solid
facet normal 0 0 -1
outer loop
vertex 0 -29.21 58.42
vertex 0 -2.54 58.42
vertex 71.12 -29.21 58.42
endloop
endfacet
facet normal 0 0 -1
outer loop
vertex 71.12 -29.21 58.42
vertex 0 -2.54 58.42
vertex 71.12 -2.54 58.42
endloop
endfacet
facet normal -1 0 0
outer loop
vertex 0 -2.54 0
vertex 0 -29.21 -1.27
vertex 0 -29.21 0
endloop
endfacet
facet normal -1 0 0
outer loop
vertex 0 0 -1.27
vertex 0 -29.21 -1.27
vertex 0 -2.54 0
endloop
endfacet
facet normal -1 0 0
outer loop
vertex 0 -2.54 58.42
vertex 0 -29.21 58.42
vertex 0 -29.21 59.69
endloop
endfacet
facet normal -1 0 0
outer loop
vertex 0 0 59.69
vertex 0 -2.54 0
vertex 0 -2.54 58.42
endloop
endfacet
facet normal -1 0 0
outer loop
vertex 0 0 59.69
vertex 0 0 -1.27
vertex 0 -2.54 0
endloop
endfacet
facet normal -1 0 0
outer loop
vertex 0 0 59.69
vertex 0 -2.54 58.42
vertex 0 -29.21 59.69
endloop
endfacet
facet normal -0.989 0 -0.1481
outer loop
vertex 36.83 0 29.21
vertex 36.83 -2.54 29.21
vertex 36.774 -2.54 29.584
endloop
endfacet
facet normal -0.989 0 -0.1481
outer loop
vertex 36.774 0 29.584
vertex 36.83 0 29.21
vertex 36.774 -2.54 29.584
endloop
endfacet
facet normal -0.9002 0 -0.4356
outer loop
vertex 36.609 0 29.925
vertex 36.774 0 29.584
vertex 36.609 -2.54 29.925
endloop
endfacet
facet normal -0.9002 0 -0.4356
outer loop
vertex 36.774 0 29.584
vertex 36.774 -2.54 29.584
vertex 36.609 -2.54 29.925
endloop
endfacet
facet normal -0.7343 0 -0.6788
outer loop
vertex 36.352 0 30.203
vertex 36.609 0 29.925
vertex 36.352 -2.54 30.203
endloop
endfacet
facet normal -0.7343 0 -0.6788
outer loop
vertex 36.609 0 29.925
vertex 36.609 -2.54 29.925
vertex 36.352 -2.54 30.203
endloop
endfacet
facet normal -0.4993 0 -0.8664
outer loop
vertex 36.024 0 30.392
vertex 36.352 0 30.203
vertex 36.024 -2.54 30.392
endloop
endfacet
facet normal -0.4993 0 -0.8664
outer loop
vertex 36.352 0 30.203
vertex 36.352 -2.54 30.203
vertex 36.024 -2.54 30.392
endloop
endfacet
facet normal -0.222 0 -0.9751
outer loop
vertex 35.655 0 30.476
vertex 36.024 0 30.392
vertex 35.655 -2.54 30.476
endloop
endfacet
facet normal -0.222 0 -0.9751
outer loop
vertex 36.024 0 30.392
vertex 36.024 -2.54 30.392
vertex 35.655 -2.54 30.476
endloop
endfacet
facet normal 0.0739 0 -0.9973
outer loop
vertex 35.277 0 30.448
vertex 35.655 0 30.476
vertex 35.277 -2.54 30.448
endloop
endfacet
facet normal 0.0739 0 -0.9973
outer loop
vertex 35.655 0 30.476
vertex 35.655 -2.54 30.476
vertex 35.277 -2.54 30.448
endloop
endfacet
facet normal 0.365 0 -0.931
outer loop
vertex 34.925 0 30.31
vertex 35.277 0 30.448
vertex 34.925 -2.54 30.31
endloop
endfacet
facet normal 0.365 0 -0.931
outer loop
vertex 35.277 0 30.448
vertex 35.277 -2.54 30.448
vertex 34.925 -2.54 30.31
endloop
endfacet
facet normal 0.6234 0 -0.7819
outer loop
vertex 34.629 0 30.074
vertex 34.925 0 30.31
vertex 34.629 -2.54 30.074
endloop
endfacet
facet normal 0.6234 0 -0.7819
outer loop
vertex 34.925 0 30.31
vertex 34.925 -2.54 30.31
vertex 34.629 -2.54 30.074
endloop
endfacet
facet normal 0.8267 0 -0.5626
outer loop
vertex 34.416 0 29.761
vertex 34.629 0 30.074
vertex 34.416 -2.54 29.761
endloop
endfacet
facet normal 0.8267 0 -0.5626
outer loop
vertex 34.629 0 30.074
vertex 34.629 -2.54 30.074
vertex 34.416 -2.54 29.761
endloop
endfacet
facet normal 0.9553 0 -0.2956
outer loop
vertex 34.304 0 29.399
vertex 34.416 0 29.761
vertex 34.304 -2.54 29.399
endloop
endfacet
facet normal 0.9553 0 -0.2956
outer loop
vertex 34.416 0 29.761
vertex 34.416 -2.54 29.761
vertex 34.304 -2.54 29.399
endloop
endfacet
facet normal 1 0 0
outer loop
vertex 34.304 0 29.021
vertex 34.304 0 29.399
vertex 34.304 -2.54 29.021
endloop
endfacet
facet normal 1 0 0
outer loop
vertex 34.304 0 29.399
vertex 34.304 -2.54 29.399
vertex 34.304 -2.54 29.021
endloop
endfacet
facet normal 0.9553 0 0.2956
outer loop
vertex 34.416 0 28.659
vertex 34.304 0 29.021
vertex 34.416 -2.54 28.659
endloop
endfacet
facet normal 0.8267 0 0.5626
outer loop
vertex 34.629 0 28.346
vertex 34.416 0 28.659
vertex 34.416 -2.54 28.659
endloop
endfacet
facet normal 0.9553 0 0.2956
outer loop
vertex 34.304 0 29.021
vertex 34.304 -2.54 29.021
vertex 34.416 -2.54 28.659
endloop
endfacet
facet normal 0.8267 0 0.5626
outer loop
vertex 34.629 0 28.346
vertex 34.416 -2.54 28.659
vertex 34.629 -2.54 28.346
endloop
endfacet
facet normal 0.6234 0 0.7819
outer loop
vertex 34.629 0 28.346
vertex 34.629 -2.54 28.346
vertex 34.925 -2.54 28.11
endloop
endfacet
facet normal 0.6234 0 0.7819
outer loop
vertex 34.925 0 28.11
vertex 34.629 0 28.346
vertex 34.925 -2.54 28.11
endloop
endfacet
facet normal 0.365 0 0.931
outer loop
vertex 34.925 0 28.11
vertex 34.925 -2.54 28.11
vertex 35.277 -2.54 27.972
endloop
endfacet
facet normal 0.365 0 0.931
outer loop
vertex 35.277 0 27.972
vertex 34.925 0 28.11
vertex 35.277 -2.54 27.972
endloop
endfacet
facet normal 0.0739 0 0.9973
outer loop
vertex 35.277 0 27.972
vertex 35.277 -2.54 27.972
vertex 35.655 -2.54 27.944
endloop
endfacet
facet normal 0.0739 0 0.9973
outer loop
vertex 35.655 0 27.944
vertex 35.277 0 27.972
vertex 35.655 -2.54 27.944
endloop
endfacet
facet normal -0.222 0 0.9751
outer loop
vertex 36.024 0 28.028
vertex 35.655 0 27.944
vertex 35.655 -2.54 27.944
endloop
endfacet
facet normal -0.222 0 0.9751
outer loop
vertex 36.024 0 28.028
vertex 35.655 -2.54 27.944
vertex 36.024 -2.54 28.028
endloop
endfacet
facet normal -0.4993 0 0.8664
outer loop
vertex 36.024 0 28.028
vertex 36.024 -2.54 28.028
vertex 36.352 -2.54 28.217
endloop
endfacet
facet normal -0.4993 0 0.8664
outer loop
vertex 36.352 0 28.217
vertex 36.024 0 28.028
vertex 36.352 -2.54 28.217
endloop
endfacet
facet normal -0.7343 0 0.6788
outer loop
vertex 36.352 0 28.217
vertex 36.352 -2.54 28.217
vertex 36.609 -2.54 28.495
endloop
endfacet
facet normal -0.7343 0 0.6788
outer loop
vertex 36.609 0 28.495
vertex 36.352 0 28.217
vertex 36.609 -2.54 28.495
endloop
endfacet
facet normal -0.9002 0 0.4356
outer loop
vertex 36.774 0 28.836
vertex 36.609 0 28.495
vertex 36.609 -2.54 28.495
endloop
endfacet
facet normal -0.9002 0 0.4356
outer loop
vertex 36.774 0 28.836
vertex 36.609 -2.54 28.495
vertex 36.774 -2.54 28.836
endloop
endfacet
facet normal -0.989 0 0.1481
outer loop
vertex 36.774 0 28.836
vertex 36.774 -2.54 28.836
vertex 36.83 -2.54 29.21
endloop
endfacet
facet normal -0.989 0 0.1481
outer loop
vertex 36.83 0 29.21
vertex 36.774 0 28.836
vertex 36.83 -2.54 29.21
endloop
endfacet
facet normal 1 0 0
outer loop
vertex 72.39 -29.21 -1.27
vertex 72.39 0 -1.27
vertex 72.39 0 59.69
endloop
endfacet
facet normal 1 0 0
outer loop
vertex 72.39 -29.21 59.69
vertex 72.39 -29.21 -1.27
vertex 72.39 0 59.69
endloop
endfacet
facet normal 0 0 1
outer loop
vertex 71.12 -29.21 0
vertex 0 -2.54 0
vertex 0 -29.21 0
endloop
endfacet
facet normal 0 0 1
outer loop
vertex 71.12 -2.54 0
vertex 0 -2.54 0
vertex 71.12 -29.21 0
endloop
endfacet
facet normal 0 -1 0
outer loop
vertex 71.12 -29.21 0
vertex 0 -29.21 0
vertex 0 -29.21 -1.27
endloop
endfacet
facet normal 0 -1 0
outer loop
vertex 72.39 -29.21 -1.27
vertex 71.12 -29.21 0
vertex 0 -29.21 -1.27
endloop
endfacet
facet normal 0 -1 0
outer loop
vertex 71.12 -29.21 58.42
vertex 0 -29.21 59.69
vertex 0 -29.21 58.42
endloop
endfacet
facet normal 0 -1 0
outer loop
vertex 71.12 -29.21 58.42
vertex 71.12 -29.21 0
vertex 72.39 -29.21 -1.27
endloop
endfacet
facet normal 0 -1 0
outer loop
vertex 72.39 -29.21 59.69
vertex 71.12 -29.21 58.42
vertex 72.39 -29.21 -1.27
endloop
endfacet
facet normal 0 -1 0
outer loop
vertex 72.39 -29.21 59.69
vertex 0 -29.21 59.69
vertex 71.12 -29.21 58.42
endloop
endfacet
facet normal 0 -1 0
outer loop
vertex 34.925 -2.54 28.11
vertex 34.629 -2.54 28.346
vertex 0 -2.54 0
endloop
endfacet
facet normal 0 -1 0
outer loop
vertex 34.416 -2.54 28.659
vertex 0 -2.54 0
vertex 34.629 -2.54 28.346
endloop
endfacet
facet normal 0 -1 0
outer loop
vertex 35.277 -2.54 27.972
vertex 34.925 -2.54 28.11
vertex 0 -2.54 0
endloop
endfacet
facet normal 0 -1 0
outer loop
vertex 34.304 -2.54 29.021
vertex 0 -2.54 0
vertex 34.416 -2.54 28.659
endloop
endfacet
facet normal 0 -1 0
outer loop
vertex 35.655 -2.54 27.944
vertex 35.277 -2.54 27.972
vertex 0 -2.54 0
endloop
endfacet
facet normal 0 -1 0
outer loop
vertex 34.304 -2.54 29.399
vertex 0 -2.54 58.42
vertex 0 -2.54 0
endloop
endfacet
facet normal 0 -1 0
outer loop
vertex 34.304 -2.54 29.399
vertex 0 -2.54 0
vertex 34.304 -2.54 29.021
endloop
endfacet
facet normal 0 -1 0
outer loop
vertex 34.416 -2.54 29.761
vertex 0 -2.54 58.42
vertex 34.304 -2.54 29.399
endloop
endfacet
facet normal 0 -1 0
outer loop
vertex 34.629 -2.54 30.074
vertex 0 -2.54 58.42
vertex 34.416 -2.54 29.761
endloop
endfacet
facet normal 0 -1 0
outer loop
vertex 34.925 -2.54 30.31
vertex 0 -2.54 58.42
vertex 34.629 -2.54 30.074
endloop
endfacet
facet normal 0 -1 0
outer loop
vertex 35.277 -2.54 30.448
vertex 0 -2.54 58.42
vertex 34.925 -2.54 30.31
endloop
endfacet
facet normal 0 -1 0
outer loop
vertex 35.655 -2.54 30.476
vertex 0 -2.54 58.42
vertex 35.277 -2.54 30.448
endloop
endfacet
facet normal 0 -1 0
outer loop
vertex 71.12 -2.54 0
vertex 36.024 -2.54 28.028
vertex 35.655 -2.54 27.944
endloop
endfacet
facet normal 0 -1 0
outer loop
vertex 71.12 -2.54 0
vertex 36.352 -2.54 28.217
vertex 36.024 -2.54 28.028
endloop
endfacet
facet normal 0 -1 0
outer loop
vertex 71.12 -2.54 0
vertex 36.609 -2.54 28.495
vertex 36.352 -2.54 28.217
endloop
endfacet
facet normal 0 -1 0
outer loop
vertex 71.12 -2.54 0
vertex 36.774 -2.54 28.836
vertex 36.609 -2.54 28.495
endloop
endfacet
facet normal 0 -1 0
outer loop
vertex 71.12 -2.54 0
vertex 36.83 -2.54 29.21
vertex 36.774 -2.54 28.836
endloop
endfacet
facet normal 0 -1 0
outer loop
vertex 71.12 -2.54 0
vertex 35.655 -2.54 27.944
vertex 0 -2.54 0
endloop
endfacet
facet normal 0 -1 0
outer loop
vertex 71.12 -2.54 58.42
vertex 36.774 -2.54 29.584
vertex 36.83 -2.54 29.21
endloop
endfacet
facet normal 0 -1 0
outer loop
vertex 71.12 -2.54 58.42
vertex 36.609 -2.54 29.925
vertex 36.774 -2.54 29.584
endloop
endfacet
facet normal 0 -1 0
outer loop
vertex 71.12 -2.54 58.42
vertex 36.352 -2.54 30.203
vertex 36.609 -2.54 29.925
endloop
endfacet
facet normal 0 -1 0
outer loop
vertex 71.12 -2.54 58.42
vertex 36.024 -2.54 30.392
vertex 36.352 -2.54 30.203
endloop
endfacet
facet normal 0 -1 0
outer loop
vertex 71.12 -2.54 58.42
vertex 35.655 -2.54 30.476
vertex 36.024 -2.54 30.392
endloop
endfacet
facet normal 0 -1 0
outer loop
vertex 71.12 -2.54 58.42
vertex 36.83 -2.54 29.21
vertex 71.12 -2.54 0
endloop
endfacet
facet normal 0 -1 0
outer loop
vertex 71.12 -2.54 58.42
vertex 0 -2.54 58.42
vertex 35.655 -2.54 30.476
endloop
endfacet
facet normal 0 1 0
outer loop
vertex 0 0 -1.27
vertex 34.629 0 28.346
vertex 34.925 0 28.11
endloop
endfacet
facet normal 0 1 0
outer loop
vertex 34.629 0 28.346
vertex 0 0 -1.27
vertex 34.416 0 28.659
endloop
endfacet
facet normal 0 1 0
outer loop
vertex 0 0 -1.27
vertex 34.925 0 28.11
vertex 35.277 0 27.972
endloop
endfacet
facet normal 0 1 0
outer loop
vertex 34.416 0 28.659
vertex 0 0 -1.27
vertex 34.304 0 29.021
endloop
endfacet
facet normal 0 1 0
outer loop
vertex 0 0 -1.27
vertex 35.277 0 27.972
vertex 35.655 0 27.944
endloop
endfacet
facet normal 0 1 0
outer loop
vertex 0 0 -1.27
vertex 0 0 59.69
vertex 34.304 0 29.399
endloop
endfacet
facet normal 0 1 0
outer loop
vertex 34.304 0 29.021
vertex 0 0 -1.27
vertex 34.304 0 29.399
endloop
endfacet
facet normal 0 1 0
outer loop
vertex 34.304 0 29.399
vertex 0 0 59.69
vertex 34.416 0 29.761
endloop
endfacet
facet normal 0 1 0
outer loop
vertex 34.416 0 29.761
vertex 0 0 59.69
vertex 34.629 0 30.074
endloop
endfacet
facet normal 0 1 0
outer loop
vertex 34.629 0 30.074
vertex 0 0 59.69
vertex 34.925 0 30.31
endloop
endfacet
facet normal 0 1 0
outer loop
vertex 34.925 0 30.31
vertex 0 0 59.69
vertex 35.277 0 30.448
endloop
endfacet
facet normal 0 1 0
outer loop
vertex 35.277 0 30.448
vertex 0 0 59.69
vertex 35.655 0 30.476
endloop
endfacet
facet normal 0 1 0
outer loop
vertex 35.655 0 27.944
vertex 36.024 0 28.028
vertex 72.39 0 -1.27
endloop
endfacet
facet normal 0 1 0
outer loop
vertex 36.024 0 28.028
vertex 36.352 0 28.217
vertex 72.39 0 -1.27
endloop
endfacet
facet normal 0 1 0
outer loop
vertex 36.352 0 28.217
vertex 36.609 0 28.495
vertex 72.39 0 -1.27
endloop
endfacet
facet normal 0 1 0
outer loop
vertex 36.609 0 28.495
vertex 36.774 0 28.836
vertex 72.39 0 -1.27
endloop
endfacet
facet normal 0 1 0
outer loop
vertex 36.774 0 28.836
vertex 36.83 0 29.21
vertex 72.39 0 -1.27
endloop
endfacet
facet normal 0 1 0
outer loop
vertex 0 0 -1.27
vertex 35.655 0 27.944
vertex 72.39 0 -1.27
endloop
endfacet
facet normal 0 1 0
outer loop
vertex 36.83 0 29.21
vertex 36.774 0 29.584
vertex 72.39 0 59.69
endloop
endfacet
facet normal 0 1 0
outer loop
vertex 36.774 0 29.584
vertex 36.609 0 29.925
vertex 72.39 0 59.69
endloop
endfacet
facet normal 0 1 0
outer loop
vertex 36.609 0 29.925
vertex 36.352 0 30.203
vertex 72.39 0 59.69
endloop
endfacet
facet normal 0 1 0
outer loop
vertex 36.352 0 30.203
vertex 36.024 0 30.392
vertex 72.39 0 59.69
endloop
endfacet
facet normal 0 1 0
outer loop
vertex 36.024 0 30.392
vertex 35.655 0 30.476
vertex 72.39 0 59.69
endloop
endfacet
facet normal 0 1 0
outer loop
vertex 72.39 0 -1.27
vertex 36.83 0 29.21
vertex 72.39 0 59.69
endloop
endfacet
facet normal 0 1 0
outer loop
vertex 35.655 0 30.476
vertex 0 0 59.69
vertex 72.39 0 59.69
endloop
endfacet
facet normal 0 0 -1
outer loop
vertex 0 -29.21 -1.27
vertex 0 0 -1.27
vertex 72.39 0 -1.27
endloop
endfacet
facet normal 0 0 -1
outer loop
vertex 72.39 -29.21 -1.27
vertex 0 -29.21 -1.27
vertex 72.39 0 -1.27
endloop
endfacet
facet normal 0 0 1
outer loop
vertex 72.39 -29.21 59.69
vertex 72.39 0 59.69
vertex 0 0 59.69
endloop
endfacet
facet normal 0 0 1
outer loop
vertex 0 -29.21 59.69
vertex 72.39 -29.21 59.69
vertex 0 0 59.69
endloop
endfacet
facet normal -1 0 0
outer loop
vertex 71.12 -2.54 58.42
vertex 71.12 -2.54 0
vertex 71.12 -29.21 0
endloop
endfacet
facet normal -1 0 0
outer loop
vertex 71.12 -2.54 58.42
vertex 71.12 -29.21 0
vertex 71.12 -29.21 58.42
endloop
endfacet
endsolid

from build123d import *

# Parameters (mm, degrees)
F0_W     = 71.12
F0_H     = 58.42
F0_H_2   = 1.27
F1_DEPTH = 29.21
F2_DEPTH = 29.211
F3_DEPTH = 2.54
F4_R     = 1.27
F5_DEPTH = 2.541


with BuildPart() as f1:
    # F0 (on Front) → F1 (new body)
    with BuildSketch(Plane.XZ):
        with Locations((35.56, 29.21)):
            Rectangle(F0_W, F0_H)
        with Locations((35.56, -0.635)):
            Rectangle(F0_W, F0_H_2)
        Polygon((71.12, 58.42), (71.12, 0), (71.12, -1.27), (72.39, -1.27), (72.39, 59.69), (71.12, 59.69), align=None)
        with Locations((35.56, 59.055)):
            Rectangle(F0_W, F0_H_2)
    extrude(amount=F1_DEPTH)

    # F0 (on Front) → F2 (cut, through all)
    with BuildSketch(Plane.XZ):
        with Locations((35.56, 29.21)):
            Rectangle(F0_W, F0_H)
    extrude(amount=F2_DEPTH, mode=Mode.SUBTRACT)

    # F0 (on Front) → F3 (join)
    with BuildSketch(Plane.XZ):
        with Locations((35.56, 29.21)):
            Rectangle(F0_W, F0_H)
    extrude(amount=F3_DEPTH)

    # F4 (on face) → F5 (cut, through all)
    with BuildSketch(Plane.XZ.offset(2.54)):
        with Locations((35.56, 29.21)):
            Circle(F4_R)
    extrude(amount=-F5_DEPTH, mode=Mode.SUBTRACT)


solid = f1.part
